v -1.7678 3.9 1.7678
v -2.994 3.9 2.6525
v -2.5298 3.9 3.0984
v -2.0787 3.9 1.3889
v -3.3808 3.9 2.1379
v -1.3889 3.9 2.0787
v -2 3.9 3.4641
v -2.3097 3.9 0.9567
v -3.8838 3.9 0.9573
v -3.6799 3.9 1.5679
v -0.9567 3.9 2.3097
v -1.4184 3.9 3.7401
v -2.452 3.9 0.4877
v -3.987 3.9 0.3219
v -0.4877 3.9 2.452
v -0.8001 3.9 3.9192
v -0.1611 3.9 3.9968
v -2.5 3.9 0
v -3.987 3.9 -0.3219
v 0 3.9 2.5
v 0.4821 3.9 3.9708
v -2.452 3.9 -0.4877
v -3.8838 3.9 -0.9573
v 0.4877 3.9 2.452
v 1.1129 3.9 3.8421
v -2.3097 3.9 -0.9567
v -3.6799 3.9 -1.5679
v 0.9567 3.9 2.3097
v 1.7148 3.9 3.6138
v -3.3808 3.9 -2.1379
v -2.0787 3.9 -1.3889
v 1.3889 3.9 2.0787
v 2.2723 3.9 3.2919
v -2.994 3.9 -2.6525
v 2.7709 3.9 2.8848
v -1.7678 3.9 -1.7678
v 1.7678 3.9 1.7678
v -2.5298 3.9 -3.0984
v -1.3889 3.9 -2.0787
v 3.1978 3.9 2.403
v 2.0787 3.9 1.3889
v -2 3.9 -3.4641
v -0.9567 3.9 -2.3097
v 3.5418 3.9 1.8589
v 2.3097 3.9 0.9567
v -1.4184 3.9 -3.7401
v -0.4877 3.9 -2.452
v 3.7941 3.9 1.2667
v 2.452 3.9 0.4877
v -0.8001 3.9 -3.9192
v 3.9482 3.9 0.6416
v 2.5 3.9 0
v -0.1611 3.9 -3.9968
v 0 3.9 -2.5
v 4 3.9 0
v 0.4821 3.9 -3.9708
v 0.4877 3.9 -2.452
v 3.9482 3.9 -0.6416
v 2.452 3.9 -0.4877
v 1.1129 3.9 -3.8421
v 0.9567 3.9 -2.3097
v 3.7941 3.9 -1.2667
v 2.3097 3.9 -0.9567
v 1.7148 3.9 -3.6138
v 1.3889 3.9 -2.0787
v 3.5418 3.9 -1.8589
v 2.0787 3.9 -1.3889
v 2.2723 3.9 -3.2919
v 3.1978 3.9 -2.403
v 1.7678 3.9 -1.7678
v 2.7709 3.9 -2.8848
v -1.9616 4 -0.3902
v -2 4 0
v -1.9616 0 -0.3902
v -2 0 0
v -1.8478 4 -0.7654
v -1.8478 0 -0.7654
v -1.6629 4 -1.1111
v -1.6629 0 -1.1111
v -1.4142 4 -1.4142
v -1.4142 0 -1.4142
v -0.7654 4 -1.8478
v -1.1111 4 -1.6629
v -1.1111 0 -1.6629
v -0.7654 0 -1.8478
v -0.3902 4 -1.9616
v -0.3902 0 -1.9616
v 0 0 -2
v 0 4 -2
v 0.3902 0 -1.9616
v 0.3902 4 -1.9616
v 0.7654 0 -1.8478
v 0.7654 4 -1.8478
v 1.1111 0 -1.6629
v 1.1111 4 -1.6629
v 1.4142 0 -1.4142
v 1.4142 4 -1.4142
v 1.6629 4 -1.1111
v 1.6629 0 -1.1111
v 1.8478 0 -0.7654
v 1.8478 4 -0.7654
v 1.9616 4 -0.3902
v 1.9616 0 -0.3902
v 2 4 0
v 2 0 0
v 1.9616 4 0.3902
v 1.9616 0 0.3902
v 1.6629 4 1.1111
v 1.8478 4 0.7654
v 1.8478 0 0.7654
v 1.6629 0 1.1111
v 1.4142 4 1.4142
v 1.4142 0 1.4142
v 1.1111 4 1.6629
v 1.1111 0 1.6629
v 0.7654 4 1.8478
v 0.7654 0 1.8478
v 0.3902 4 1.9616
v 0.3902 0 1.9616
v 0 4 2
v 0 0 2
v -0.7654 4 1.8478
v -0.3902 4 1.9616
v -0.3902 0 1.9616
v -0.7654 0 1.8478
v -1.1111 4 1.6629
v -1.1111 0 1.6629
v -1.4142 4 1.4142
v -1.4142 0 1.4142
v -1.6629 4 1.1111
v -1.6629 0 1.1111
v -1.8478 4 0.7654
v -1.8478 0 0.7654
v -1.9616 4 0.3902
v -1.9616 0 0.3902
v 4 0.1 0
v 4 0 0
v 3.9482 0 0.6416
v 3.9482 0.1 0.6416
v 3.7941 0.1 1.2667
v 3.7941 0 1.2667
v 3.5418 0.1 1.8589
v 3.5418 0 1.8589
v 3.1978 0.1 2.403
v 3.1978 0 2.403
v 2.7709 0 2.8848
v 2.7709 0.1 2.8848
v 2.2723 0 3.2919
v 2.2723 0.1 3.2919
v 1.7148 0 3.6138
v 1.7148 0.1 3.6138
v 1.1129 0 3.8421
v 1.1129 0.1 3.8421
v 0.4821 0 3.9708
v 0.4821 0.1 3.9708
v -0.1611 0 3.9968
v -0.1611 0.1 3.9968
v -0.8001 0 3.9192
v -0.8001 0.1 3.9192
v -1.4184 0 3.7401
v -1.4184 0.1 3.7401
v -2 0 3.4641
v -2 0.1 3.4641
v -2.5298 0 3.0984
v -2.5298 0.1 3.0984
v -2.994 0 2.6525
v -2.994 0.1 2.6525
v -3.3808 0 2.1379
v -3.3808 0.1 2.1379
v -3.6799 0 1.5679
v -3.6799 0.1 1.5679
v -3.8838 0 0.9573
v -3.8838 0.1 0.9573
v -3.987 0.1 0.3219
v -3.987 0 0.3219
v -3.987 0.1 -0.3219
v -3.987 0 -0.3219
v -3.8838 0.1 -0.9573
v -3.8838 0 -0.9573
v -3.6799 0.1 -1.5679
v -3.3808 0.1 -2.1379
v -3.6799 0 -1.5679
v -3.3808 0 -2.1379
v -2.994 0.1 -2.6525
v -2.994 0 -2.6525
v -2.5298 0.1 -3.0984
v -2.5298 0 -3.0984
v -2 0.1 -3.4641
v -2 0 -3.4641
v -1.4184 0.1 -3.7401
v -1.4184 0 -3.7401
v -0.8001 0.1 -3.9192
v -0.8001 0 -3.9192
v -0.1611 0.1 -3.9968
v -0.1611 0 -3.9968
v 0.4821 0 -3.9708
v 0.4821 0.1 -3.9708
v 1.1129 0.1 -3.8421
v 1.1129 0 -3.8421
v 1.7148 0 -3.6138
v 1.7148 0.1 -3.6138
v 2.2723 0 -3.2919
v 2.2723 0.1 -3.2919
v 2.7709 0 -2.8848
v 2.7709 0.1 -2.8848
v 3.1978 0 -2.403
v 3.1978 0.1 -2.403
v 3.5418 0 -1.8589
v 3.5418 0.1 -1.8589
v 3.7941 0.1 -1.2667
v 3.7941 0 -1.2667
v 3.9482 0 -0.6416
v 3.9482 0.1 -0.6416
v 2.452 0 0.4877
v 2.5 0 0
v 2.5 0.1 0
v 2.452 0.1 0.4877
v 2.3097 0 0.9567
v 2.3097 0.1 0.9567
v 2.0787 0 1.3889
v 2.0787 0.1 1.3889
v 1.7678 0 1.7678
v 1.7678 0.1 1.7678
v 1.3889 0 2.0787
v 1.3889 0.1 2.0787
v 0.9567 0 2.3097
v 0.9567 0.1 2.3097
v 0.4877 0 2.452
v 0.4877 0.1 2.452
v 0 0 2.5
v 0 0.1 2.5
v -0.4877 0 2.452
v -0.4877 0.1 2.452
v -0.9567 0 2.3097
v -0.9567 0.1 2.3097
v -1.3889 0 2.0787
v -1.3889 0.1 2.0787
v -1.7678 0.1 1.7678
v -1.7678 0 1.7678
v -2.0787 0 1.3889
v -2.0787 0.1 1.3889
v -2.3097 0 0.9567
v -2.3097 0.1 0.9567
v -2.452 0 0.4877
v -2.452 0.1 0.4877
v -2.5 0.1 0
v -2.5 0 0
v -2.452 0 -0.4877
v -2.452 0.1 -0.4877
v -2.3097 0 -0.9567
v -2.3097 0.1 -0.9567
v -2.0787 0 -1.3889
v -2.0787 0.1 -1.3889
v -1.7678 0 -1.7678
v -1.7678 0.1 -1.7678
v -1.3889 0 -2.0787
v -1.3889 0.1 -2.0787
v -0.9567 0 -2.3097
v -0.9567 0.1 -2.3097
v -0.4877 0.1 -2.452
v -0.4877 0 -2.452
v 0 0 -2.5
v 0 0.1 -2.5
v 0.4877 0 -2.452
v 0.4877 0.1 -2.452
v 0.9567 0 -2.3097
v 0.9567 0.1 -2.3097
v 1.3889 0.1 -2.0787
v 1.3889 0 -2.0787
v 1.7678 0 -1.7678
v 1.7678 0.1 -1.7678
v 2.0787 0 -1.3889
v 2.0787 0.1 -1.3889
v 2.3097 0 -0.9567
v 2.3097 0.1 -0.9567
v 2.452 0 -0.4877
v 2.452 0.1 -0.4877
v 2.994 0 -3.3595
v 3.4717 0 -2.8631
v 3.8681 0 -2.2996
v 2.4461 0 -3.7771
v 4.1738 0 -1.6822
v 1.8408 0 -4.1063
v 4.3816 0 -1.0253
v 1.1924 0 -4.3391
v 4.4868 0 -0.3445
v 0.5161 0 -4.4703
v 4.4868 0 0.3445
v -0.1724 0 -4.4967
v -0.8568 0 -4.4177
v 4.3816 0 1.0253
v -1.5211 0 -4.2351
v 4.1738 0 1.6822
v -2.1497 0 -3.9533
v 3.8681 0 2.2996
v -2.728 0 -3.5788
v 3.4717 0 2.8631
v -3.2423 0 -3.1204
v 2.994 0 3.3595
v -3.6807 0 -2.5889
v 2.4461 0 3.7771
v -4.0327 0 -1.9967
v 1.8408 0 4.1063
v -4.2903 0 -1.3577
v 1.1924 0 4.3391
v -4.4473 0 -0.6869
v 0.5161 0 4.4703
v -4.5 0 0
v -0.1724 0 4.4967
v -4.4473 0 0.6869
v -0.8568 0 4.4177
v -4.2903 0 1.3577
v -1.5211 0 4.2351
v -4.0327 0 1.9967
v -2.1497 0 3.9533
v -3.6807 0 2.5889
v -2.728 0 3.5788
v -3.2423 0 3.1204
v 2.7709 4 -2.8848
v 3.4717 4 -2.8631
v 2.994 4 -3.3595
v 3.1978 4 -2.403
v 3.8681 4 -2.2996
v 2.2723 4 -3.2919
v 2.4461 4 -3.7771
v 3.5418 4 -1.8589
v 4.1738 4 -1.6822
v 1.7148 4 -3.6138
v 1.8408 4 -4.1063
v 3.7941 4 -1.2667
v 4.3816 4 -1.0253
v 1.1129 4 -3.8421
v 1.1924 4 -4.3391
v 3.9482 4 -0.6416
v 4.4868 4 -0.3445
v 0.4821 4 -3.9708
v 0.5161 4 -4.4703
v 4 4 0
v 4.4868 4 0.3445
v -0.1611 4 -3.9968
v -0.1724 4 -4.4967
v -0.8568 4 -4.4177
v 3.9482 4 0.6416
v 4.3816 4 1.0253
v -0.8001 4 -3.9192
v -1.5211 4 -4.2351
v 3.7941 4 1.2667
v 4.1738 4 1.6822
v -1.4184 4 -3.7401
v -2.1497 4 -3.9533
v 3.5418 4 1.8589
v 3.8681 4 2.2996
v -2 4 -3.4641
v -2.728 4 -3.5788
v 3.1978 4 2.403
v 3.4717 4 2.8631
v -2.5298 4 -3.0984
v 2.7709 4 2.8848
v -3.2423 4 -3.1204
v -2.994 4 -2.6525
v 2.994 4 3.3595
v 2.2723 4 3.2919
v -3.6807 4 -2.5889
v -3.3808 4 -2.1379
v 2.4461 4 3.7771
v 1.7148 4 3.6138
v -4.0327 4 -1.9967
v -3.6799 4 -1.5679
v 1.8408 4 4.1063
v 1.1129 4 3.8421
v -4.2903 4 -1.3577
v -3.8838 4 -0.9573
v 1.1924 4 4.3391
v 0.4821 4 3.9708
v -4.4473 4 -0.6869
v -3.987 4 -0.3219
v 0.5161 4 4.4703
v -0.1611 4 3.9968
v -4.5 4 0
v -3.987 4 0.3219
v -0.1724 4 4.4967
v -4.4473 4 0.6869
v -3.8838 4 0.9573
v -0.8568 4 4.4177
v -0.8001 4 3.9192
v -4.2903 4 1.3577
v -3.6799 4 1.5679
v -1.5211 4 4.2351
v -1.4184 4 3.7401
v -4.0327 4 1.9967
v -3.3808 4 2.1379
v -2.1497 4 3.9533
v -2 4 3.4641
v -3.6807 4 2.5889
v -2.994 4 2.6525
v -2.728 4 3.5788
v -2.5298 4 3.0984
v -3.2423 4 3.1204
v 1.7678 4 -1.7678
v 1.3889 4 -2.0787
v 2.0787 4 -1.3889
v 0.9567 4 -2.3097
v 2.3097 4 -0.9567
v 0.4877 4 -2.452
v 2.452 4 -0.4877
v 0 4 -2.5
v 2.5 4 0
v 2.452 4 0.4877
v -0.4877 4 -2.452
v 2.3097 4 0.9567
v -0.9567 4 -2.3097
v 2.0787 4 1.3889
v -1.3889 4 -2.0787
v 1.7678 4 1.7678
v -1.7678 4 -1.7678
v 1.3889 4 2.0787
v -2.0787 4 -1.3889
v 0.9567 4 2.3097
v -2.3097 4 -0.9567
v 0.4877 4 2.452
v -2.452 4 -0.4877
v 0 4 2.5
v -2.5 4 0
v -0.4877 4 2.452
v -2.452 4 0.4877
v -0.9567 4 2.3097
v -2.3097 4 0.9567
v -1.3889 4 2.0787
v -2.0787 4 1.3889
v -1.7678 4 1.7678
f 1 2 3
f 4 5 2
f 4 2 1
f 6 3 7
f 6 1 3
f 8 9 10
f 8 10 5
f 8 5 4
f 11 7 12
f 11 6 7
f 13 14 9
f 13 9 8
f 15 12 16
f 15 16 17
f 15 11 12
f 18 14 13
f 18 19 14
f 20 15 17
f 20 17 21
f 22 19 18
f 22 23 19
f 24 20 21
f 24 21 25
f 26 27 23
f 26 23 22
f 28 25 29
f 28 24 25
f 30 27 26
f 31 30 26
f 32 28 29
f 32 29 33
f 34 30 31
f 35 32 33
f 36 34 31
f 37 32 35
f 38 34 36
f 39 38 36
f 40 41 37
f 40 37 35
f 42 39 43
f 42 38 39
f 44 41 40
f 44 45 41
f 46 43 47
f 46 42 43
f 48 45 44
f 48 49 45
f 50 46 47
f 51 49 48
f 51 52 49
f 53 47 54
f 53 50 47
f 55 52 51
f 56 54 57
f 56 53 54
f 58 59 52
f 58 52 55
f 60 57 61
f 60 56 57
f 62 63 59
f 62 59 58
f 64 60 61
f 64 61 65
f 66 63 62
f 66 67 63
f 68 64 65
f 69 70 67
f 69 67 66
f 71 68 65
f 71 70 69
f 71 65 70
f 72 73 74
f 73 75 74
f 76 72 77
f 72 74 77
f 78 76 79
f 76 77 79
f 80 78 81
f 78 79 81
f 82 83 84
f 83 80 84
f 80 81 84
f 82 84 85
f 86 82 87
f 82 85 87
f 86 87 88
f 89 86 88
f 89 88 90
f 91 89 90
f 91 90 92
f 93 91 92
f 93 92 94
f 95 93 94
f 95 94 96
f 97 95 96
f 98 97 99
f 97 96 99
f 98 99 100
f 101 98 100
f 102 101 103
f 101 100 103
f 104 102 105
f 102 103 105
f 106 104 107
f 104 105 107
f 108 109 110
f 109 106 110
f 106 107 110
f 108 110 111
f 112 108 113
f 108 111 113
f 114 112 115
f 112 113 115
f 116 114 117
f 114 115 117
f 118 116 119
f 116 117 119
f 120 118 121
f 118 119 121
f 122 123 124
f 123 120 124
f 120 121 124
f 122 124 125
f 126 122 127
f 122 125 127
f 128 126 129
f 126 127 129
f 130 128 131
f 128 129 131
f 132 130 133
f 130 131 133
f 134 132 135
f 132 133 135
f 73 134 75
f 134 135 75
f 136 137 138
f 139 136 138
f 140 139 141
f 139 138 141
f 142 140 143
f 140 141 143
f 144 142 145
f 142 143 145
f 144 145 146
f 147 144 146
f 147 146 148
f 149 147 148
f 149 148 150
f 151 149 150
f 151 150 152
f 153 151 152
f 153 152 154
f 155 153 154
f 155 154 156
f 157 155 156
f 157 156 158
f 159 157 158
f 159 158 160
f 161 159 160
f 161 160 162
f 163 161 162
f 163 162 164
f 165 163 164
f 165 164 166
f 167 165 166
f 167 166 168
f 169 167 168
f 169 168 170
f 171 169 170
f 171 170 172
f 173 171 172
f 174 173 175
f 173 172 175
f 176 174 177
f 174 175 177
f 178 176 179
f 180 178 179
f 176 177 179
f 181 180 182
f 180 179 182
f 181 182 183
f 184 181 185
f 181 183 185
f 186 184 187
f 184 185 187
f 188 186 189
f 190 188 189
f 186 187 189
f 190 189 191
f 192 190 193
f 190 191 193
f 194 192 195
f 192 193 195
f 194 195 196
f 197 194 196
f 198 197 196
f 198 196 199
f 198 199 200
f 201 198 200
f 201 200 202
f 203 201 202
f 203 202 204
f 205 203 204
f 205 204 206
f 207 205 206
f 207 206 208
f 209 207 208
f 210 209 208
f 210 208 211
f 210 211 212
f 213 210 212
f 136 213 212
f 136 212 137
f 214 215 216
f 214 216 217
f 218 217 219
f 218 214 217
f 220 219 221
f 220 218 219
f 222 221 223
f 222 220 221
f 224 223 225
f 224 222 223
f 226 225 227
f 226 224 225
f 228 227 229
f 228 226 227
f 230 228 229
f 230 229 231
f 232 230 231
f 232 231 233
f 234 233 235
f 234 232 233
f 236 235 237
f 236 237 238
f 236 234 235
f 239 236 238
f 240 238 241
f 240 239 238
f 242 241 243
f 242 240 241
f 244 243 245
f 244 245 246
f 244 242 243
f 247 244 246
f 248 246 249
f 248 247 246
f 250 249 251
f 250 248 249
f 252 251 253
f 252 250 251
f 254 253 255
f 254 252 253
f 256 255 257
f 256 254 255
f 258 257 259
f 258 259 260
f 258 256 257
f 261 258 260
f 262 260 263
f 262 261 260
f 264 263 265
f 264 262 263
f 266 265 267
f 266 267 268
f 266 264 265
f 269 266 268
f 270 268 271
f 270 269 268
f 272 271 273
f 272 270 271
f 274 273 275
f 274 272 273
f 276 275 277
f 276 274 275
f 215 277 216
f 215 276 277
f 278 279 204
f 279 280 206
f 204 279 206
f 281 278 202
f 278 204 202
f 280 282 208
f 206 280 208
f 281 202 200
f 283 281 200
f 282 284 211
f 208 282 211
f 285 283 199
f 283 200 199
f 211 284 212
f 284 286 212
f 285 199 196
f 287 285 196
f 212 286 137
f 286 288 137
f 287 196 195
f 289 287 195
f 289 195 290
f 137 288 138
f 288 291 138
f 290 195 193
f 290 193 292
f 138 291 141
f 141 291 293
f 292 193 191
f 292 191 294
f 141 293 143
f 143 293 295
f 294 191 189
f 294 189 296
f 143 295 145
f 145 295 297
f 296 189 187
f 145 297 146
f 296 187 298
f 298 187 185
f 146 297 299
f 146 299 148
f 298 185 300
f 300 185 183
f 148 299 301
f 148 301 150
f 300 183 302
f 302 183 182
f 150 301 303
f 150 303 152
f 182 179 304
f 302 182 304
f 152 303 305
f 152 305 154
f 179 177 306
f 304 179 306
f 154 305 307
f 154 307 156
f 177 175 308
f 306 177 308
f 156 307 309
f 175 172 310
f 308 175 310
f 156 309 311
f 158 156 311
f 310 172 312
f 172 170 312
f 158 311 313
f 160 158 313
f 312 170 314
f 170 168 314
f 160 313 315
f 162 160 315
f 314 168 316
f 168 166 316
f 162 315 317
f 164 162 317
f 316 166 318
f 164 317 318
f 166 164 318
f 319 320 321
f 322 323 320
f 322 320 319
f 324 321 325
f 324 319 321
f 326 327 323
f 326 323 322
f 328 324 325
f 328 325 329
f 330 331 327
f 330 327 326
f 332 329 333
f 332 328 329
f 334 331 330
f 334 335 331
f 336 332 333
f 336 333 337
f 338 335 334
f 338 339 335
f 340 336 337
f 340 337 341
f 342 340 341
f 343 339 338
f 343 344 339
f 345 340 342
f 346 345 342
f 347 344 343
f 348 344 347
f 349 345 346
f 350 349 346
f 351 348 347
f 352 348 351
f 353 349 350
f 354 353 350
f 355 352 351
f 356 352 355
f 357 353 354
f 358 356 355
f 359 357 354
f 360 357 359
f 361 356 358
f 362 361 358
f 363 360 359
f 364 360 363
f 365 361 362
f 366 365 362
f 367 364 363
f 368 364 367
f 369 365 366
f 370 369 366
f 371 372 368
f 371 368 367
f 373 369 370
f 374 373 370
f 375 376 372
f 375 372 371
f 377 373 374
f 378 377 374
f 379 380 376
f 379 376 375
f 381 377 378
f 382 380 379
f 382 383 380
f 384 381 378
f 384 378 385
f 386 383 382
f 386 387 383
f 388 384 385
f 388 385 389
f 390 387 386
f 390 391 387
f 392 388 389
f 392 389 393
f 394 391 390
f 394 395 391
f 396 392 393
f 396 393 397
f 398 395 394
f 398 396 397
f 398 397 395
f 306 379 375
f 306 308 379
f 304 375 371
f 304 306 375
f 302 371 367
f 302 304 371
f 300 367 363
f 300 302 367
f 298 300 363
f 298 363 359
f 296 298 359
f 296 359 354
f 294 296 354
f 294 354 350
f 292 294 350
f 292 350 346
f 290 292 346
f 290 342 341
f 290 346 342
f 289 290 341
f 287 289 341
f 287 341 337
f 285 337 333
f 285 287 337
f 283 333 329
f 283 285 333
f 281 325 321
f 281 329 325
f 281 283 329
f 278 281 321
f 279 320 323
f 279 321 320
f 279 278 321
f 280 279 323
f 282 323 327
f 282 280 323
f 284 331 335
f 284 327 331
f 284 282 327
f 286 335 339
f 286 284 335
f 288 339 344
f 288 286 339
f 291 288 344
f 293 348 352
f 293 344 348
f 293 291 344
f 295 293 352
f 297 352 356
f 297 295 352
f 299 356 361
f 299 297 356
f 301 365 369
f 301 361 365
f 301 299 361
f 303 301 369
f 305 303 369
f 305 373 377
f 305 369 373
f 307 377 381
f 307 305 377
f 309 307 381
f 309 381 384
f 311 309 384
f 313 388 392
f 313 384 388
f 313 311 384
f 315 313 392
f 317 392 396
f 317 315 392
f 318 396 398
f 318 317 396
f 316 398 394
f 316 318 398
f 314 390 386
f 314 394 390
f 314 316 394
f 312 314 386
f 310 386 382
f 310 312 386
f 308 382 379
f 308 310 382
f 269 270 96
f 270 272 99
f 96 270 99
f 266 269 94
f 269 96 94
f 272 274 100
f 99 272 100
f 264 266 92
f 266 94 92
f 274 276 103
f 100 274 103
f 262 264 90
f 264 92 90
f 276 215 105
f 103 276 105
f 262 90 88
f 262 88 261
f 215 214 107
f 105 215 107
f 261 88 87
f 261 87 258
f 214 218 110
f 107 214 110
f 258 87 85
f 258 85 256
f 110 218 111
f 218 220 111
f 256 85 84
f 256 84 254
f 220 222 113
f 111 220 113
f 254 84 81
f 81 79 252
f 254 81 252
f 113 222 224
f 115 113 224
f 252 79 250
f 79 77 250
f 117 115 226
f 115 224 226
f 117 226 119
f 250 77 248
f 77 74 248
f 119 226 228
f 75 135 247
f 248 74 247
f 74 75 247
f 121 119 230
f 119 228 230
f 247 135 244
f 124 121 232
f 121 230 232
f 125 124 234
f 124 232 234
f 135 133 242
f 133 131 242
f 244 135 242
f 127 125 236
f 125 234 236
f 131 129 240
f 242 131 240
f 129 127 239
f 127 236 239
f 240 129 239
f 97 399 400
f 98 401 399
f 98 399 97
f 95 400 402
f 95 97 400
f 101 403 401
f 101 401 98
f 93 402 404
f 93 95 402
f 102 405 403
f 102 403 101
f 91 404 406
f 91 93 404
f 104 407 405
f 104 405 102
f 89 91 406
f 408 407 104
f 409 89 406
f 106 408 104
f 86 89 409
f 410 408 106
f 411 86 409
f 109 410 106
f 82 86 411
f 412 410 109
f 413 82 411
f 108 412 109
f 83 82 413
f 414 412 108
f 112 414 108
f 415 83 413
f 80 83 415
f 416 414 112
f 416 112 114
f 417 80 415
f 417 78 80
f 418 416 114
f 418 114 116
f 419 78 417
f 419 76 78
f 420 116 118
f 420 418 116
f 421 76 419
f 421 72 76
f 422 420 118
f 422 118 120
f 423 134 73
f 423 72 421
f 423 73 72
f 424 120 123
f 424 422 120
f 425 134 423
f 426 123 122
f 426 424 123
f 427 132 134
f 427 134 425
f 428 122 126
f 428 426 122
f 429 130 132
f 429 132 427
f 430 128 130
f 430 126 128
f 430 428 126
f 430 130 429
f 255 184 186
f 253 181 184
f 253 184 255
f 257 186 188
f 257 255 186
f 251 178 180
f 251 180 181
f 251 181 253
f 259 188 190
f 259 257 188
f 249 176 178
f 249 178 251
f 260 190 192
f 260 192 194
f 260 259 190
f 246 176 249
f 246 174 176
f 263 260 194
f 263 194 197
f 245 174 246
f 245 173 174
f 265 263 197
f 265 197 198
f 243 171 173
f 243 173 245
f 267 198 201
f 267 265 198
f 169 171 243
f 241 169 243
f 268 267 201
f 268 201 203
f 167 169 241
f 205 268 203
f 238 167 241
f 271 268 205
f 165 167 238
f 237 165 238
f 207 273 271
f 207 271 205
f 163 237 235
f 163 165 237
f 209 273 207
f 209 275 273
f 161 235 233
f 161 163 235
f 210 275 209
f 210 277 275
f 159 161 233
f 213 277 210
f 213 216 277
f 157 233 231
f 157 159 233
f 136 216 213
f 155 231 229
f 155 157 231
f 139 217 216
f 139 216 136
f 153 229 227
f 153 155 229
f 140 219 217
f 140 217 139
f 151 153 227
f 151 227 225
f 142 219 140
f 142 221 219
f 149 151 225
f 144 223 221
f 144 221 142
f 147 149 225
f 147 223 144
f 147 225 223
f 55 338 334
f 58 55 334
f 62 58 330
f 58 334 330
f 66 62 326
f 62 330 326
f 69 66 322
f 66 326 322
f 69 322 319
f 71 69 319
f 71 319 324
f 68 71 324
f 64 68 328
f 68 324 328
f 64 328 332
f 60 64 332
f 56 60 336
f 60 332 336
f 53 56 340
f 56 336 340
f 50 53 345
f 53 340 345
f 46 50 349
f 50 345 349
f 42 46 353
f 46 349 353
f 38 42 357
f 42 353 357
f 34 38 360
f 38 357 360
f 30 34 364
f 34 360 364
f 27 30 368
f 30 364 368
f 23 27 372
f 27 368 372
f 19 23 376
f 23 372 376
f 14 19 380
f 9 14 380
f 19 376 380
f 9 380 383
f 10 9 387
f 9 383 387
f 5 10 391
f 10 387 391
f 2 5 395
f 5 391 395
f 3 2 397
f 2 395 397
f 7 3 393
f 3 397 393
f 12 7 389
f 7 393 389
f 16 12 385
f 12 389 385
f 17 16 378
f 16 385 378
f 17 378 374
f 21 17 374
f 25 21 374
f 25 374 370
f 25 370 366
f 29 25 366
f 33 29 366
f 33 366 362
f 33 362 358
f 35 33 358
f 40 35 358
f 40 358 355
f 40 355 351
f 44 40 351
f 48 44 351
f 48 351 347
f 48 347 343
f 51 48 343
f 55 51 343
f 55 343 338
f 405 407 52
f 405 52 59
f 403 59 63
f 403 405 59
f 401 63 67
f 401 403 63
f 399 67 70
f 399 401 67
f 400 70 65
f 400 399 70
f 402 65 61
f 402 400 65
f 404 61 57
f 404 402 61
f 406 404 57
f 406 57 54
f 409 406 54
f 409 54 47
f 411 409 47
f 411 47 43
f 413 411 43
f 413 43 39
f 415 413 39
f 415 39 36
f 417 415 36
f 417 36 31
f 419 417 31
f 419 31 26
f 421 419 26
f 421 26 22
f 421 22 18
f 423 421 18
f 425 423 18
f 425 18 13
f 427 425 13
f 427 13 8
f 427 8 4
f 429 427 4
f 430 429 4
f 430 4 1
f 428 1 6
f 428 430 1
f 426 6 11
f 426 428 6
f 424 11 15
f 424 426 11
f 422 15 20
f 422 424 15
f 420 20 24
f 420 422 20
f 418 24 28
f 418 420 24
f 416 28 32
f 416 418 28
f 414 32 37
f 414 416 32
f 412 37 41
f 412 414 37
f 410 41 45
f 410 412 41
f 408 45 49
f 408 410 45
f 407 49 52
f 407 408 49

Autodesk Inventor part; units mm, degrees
ref_plane "YZ Plane" through (0, 0, 0) normal (1, 0, 0) x (0, 1, 0)
ref_plane "XZ Plane" through (0, 0, 0) normal (0, 1, 0) x (-1, 0, 0)
ref_plane "XY Plane" through (0, 0, 0) normal (0, 0, 1) x (1, 0, 0)
sketch "Sketch1" plane through (0, 0, 0) normal (0, 1, 0) x (-1, 0, 0)
  circle A0 centre (0, 0) radius 2
  circle A1 centre (0, 0) radius 4.5
  dimension "d0" = 4
  dimension "d1" = 9
extrude "Extrusion1" add sketch "Sketch1" along normal blind 4
sketch "Sketch2" plane through (0, 4, 0) normal (0, 1, 0) x (1, 0, 0)
  circle A0 centre (0, 0) radius 4.5 projected
  circle A1 centre (0, 0) radius 2 projected
  circle A2 centre (0, 0) radius 2.5
  circle A3 centre (0, 0) radius 2 projected
  circle A4 centre (0, 0) radius 4
  dimension "d4" = 5
  dimension "d5" = 8
extrude "Extrusion2" cut sketch "Sketch2" against normal blind 0.1 contours A4
sketch "Sketch3" plane through (0, 0, 0) normal (0, -1, 0) x (1, 0, 0)
  circle A0 centre (0, 0) radius 4 projected
  circle A1 centre (0, 0) radius 2.5 projected
extrude "Extrusion3" cut sketch "Sketch3" against normal blind 0.1
properties part number "bearing_4_9_4"
